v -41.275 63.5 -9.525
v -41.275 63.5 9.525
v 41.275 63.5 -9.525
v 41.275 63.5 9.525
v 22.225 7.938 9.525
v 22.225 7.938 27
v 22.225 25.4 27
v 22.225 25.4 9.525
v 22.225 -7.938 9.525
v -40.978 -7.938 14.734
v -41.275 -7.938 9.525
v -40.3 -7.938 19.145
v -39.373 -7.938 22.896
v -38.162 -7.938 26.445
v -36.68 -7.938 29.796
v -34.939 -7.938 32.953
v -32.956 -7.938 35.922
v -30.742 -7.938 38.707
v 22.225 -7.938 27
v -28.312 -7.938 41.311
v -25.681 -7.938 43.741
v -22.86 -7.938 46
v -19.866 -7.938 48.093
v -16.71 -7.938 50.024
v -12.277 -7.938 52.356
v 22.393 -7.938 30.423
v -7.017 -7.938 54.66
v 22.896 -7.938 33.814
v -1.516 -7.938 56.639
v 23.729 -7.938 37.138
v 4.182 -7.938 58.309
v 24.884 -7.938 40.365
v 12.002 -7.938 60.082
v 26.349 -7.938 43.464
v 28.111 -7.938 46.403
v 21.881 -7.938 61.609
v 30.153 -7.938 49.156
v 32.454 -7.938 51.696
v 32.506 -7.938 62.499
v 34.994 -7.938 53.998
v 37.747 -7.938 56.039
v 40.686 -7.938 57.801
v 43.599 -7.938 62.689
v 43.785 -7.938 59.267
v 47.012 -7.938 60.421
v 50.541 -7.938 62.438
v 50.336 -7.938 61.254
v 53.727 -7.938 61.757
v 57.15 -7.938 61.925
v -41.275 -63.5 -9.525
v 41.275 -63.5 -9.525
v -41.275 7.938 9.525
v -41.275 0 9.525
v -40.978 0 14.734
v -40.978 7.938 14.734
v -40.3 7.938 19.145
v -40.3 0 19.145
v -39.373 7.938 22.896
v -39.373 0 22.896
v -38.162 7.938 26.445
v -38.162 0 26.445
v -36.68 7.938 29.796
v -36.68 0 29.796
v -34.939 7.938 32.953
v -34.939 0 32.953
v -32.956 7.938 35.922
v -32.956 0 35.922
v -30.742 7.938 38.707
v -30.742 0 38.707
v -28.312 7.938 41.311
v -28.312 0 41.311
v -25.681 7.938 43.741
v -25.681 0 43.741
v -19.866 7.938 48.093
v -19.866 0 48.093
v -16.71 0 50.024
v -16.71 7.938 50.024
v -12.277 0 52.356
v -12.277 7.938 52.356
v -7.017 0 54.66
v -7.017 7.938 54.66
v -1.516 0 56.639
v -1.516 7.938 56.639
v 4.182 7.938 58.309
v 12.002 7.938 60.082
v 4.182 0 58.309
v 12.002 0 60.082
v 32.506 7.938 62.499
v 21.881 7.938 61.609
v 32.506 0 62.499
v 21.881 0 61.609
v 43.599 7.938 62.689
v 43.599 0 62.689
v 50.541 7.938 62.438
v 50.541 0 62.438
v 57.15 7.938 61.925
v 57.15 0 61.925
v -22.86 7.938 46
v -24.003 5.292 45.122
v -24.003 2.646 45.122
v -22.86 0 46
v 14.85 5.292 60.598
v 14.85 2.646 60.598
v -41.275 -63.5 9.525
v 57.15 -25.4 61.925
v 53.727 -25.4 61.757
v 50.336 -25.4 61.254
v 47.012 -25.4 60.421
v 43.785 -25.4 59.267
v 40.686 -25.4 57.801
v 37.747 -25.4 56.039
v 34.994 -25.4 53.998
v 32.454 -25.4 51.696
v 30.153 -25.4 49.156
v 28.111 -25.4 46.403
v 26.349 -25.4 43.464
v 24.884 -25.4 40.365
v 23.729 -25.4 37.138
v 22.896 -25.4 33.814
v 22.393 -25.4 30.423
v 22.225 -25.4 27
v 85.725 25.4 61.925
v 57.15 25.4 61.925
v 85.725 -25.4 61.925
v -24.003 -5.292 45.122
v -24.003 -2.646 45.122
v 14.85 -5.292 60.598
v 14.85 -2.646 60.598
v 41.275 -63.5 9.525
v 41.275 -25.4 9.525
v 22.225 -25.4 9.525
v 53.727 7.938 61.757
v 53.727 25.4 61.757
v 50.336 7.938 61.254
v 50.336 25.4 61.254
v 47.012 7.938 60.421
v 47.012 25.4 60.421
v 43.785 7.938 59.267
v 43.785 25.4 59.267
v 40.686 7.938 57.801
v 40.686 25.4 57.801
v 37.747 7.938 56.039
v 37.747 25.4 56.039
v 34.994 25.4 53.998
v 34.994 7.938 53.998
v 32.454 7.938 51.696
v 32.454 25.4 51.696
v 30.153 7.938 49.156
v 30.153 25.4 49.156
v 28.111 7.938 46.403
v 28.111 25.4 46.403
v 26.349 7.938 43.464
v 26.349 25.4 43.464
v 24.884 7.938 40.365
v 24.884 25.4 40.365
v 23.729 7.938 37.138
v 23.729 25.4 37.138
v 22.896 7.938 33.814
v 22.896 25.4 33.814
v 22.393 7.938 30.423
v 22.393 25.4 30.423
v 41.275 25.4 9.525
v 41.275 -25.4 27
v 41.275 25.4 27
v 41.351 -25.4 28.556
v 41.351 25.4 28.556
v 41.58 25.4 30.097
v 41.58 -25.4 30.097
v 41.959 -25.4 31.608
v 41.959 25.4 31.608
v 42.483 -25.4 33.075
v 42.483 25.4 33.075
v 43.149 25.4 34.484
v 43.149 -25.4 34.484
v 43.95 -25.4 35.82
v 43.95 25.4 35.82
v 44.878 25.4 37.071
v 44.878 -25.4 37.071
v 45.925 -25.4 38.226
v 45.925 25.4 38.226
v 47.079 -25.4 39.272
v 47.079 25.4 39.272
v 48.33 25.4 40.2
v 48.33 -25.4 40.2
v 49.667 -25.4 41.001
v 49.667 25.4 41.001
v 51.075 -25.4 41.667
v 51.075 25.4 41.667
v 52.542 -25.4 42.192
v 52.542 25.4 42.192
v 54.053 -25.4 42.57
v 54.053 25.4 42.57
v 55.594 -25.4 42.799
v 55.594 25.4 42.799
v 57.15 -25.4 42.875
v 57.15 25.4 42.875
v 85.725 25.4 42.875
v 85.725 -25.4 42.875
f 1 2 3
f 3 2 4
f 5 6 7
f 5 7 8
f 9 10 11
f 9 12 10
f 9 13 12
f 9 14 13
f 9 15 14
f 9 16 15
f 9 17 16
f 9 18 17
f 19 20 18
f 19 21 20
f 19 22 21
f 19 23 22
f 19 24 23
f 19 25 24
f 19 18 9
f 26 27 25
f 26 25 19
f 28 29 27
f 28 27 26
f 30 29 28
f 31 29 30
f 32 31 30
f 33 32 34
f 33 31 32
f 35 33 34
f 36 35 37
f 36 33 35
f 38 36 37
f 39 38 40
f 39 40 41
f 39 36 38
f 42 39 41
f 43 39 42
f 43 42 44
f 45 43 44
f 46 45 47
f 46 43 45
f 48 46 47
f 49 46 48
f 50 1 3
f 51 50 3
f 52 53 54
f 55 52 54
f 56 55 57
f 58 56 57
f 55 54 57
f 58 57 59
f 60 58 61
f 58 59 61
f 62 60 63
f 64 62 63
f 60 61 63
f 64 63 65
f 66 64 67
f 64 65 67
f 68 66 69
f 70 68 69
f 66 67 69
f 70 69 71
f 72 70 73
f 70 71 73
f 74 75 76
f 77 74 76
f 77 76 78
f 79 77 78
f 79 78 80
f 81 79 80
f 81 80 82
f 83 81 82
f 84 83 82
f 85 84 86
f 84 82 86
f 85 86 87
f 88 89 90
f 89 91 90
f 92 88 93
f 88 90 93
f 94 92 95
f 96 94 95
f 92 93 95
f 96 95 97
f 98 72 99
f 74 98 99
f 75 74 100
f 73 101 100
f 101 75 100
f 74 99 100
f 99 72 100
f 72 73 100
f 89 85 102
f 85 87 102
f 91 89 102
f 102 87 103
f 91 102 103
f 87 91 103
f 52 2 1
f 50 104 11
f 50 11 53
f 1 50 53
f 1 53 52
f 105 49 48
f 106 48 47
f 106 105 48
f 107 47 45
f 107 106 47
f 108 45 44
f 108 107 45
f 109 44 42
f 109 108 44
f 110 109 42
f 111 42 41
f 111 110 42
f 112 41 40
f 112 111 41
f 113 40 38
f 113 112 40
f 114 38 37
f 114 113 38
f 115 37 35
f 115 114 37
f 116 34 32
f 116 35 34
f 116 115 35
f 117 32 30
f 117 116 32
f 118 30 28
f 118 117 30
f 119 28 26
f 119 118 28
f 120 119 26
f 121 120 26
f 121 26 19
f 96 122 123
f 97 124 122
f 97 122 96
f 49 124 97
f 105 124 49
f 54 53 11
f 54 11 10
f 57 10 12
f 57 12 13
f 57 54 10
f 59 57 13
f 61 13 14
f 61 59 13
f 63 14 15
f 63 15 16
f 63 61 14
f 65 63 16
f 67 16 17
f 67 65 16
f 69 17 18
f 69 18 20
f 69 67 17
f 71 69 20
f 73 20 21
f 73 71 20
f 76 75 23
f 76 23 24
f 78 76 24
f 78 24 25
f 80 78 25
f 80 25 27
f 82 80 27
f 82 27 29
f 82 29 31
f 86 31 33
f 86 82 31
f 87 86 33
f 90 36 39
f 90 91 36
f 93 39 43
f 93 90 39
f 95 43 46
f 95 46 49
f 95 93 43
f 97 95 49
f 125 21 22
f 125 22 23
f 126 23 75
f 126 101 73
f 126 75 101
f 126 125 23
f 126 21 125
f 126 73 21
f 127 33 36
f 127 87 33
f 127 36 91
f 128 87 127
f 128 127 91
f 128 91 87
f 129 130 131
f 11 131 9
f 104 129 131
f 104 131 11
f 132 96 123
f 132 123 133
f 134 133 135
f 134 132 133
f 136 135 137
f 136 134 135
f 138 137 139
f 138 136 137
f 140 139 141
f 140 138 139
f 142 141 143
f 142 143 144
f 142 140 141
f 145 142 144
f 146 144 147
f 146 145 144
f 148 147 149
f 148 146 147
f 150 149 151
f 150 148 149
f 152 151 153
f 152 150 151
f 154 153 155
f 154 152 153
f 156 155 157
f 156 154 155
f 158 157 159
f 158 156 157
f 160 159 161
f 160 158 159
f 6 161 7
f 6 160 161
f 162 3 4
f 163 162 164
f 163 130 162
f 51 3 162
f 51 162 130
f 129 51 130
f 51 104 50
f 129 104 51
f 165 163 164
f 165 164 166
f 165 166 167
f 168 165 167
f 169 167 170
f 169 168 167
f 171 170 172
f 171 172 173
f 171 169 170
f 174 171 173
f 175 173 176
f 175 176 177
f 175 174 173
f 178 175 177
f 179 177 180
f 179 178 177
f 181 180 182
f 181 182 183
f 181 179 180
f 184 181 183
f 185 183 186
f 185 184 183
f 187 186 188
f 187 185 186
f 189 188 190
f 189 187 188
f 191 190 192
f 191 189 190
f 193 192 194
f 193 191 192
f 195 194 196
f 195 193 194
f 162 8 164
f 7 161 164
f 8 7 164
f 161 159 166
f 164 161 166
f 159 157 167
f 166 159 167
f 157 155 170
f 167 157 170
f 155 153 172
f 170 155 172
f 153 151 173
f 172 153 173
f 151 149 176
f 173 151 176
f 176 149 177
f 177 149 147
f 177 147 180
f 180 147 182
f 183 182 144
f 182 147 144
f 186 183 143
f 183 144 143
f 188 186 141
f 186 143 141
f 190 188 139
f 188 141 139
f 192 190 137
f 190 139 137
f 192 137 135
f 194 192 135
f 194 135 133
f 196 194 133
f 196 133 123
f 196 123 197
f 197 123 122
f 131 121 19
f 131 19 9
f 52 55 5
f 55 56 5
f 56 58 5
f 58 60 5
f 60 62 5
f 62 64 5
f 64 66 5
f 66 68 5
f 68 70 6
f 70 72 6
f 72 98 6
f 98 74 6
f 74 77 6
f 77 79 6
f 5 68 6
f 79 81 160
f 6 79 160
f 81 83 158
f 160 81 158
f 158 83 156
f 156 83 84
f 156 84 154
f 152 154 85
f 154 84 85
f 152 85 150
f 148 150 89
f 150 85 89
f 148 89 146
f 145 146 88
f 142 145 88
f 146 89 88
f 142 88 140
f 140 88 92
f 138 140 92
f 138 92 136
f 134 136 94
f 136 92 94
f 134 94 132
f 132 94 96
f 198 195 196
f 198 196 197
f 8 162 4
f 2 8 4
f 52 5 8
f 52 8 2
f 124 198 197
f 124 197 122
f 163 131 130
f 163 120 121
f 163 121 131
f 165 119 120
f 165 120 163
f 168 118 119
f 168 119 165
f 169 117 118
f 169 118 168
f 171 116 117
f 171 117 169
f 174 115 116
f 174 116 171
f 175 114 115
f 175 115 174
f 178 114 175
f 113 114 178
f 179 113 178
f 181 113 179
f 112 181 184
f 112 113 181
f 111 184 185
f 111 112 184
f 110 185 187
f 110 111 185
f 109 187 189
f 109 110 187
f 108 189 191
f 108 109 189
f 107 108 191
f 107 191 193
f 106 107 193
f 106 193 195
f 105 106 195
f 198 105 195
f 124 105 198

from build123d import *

# Parameters (mm, degrees)
F1_DEPTH = 63.5
F0_W     = 25.4
F0_H     = 19.05
F2_DEPTH = 25.4
F3_DEPTH = 7.9375


with BuildPart() as f1:
    # F0 (on Front) → F1 (new body, symmetric)
    with BuildSketch(Plane.XZ):
        Polygon((41.275, -9.525), (41.275, 9.525), (22.225, 9.525), (-41.275, 9.525), (-41.275, -9.525), align=None)
    extrude(amount=F1_DEPTH, both=True)

    # F0 (on Front) → F2 (join, symmetric)
    with BuildSketch(Plane.XZ):
        with BuildLine():
            Line((22.225, 9.525), (41.275, 9.525))
            Line((41.275, 9.525), (41.275, 27.0002))
            ThreePointArc((41.275, 27.0002), (45.9246798487, 38.2255201513), (57.15, 42.8752))
            Line((57.15, 42.8752), (60.325, 42.8752))
            Line((60.325, 42.8752), (60.325, 61.9252))
            Line((60.325, 61.9252), (57.15, 61.9252))
            ThreePointArc((57.15, 61.9252), (32.4542956671, 51.6959043329), (22.225, 27.0002))
            Line((22.225, 27.0002), (22.225, 9.525))
        make_face()
        with Locations((73.025, 52.4002)):
            Rectangle(F0_W, F0_H)
    extrude(amount=F2_DEPTH, both=True)

    # F0 (on Front) → F3 (join, symmetric)
    with BuildSketch(Plane.XZ):
        with BuildLine():
            Line((-41.275, 9.525), (22.225, 9.525))
            Line((22.225, 9.525), (22.225, 27.0002))
            ThreePointArc((22.225, 27.0002), (32.4542956671, 51.6959043329), (57.15, 61.9252))
            add(Edge.make_bspline(
                [(-41.275, 9.525), (-40.8389680088, 57.1731589735), (19.1717255543, 65.6824364242), (57.15, 61.9252)],
                knots=[0, 0, 0, 0, 111.5045361635, 111.5045361635, 111.5045361635, 111.5045361635], degree=3))
        make_face()
    extrude(amount=F3_DEPTH, both=True)


solid = f1.part
